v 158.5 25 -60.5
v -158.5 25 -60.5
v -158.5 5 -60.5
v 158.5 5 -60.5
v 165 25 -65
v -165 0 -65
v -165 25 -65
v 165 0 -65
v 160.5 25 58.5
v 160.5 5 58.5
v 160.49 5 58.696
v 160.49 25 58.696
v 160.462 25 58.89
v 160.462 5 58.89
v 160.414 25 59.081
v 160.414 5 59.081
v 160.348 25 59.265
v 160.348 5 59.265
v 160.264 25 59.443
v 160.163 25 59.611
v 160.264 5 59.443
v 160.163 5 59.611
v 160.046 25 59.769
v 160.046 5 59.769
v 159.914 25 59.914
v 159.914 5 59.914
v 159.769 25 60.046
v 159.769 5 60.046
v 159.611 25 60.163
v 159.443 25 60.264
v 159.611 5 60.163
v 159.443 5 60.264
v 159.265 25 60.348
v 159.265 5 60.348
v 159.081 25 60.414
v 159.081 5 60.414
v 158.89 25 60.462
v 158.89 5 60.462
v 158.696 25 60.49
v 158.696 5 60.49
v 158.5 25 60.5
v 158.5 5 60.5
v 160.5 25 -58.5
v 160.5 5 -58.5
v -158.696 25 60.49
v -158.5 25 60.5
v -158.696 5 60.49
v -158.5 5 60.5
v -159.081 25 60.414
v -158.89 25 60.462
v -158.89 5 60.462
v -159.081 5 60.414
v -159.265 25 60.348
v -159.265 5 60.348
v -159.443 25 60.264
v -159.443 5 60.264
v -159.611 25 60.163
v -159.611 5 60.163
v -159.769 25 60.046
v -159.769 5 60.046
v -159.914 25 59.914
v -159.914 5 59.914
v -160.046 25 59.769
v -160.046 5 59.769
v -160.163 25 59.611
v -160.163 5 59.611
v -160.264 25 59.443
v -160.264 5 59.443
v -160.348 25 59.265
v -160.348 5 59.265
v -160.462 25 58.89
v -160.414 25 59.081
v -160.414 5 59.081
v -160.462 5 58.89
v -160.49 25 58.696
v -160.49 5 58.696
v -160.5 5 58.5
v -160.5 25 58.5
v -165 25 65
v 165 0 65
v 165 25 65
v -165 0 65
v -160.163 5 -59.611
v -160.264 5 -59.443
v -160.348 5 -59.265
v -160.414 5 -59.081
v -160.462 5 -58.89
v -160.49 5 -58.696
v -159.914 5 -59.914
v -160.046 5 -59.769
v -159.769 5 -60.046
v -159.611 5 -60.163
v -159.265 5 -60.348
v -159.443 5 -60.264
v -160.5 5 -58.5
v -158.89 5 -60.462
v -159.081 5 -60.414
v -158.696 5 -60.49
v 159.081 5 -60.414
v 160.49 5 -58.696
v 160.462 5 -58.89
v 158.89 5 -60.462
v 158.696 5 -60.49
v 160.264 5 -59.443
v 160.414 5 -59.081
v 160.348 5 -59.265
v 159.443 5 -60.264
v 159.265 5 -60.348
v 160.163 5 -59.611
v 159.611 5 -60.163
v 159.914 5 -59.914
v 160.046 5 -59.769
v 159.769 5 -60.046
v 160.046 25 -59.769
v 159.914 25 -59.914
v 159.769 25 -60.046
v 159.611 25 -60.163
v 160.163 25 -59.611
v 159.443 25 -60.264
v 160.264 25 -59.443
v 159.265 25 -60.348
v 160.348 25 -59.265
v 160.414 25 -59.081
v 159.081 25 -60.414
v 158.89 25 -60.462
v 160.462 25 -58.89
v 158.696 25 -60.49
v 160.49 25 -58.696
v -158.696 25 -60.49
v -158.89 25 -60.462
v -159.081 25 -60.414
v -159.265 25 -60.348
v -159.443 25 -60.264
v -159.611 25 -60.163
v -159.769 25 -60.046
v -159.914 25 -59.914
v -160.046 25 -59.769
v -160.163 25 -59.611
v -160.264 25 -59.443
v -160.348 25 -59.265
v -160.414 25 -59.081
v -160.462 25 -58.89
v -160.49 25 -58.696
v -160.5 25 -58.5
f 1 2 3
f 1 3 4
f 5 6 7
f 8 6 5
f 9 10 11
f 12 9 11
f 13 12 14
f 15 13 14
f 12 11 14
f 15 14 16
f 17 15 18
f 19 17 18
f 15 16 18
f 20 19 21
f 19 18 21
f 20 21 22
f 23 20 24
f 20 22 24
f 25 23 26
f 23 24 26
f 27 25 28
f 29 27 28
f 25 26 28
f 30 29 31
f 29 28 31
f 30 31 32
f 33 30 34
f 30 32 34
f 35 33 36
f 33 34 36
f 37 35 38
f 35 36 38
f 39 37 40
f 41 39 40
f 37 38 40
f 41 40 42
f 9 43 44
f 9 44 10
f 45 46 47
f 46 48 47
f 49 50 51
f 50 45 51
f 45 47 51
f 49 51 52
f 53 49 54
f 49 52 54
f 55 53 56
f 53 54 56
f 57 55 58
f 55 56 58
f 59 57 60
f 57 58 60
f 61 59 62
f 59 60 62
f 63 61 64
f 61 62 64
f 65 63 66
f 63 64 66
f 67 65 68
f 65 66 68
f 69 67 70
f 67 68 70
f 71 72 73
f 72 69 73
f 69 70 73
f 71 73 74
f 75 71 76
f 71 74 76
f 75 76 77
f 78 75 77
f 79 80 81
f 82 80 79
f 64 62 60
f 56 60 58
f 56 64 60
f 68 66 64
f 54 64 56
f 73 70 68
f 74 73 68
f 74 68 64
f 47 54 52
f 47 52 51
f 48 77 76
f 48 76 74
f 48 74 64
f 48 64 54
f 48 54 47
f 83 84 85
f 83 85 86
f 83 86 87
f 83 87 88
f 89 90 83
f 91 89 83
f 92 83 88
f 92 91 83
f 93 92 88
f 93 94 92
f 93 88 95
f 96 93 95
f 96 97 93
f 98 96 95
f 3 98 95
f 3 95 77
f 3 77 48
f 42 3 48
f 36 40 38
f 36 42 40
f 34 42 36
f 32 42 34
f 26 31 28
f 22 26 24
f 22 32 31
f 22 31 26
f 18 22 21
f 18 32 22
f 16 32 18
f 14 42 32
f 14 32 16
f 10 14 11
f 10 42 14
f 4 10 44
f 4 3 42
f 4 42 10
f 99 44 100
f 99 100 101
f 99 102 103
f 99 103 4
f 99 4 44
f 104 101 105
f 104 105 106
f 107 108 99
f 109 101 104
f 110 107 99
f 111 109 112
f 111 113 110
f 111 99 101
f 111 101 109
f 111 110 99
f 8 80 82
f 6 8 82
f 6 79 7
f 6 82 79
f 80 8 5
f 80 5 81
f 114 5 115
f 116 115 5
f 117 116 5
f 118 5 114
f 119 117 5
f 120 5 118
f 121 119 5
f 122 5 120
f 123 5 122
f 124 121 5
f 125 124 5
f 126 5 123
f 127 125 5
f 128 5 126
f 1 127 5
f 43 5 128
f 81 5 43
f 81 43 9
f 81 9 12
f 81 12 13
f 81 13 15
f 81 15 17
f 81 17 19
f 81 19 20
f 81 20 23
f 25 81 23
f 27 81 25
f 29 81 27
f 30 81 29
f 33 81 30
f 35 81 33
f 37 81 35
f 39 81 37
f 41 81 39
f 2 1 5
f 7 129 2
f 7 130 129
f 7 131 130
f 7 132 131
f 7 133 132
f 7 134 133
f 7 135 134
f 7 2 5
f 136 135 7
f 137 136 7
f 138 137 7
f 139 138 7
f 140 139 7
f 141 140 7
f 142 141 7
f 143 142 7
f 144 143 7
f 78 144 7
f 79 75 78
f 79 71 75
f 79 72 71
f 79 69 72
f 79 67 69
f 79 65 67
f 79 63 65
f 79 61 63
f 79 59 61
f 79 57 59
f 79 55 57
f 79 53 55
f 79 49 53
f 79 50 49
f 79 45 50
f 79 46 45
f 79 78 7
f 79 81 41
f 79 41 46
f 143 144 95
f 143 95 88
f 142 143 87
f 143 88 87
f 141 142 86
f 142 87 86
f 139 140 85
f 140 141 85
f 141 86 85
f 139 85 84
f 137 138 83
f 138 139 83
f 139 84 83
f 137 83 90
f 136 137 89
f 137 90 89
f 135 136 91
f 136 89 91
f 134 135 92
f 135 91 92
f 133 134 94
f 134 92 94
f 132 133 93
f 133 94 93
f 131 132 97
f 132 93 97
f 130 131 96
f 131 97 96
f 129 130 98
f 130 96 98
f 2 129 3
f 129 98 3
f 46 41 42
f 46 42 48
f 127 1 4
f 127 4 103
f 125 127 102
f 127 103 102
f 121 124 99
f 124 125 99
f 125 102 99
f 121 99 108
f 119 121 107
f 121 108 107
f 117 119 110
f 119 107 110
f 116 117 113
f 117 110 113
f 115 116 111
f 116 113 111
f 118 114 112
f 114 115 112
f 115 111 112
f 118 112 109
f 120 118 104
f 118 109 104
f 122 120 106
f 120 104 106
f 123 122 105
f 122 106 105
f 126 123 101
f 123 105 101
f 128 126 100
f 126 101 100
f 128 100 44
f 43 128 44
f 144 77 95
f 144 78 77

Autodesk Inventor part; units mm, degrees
ref_plane "YZ Plane" through (0, 0, 0) normal (1, 0, 0) x (0, 1, 0)
ref_plane "XZ Plane" through (0, 0, 0) normal (0, 1, 0) x (-1, 0, 0)
ref_plane "XY Plane" through (0, 0, 0) normal (0, 0, 1) x (1, 0, 0)
sketch "Sketch1" plane through (0, 0, 0) normal (0, 1, 0) x (-1, 0, 0)
  line L0 (-165, 65) -> (165, 65)
  line L1 (165, 65) -> (165, -65)
  line L2 (165, -65) -> (-165, -65)
  line L3 (-165, -65) -> (-165, 65)
  line L4 (-165, 65) -> (165, -65) construction
  line L5 (165, 65) -> (-165, -65) construction
  point P0 (0, 0)
  dimension "d0" = 330
  dimension "d1" = 130
extrude "Extrusion1" add sketch "Sketch1" along normal blind 25
sketch "Sketch2" plane through (0, 25, 0) normal (0, 1, 0) x (1, 0, 0)
  line L0 (160.5, -60.5) -> (-160.5, -60.5)
  line L1 (-160.5, -60.5) -> (-160.5, 60.5)
  line L2 (-160.5, 60.5) -> (160.5, 60.5)
  line L3 (160.5, 60.5) -> (160.5, -60.5)
  line L4 (160.5, -60.5) -> (-160.5, 60.5) construction
  line L5 (-160.5, -60.5) -> (160.5, 60.5) construction
  point P0 (0, 0)
  dimension "d4" = 321
  dimension "d5" = 121
extrude "Extrusion2" cut sketch "Sketch2" against normal blind 20
fillet "Fillet1" radius 2 4 edges at (-160.5, 15, -60.5) (160.5, 15, -60.5) (-160.5, 15, 60.5) (160.5, 15, 60.5)
properties part number "Shelf V2"
